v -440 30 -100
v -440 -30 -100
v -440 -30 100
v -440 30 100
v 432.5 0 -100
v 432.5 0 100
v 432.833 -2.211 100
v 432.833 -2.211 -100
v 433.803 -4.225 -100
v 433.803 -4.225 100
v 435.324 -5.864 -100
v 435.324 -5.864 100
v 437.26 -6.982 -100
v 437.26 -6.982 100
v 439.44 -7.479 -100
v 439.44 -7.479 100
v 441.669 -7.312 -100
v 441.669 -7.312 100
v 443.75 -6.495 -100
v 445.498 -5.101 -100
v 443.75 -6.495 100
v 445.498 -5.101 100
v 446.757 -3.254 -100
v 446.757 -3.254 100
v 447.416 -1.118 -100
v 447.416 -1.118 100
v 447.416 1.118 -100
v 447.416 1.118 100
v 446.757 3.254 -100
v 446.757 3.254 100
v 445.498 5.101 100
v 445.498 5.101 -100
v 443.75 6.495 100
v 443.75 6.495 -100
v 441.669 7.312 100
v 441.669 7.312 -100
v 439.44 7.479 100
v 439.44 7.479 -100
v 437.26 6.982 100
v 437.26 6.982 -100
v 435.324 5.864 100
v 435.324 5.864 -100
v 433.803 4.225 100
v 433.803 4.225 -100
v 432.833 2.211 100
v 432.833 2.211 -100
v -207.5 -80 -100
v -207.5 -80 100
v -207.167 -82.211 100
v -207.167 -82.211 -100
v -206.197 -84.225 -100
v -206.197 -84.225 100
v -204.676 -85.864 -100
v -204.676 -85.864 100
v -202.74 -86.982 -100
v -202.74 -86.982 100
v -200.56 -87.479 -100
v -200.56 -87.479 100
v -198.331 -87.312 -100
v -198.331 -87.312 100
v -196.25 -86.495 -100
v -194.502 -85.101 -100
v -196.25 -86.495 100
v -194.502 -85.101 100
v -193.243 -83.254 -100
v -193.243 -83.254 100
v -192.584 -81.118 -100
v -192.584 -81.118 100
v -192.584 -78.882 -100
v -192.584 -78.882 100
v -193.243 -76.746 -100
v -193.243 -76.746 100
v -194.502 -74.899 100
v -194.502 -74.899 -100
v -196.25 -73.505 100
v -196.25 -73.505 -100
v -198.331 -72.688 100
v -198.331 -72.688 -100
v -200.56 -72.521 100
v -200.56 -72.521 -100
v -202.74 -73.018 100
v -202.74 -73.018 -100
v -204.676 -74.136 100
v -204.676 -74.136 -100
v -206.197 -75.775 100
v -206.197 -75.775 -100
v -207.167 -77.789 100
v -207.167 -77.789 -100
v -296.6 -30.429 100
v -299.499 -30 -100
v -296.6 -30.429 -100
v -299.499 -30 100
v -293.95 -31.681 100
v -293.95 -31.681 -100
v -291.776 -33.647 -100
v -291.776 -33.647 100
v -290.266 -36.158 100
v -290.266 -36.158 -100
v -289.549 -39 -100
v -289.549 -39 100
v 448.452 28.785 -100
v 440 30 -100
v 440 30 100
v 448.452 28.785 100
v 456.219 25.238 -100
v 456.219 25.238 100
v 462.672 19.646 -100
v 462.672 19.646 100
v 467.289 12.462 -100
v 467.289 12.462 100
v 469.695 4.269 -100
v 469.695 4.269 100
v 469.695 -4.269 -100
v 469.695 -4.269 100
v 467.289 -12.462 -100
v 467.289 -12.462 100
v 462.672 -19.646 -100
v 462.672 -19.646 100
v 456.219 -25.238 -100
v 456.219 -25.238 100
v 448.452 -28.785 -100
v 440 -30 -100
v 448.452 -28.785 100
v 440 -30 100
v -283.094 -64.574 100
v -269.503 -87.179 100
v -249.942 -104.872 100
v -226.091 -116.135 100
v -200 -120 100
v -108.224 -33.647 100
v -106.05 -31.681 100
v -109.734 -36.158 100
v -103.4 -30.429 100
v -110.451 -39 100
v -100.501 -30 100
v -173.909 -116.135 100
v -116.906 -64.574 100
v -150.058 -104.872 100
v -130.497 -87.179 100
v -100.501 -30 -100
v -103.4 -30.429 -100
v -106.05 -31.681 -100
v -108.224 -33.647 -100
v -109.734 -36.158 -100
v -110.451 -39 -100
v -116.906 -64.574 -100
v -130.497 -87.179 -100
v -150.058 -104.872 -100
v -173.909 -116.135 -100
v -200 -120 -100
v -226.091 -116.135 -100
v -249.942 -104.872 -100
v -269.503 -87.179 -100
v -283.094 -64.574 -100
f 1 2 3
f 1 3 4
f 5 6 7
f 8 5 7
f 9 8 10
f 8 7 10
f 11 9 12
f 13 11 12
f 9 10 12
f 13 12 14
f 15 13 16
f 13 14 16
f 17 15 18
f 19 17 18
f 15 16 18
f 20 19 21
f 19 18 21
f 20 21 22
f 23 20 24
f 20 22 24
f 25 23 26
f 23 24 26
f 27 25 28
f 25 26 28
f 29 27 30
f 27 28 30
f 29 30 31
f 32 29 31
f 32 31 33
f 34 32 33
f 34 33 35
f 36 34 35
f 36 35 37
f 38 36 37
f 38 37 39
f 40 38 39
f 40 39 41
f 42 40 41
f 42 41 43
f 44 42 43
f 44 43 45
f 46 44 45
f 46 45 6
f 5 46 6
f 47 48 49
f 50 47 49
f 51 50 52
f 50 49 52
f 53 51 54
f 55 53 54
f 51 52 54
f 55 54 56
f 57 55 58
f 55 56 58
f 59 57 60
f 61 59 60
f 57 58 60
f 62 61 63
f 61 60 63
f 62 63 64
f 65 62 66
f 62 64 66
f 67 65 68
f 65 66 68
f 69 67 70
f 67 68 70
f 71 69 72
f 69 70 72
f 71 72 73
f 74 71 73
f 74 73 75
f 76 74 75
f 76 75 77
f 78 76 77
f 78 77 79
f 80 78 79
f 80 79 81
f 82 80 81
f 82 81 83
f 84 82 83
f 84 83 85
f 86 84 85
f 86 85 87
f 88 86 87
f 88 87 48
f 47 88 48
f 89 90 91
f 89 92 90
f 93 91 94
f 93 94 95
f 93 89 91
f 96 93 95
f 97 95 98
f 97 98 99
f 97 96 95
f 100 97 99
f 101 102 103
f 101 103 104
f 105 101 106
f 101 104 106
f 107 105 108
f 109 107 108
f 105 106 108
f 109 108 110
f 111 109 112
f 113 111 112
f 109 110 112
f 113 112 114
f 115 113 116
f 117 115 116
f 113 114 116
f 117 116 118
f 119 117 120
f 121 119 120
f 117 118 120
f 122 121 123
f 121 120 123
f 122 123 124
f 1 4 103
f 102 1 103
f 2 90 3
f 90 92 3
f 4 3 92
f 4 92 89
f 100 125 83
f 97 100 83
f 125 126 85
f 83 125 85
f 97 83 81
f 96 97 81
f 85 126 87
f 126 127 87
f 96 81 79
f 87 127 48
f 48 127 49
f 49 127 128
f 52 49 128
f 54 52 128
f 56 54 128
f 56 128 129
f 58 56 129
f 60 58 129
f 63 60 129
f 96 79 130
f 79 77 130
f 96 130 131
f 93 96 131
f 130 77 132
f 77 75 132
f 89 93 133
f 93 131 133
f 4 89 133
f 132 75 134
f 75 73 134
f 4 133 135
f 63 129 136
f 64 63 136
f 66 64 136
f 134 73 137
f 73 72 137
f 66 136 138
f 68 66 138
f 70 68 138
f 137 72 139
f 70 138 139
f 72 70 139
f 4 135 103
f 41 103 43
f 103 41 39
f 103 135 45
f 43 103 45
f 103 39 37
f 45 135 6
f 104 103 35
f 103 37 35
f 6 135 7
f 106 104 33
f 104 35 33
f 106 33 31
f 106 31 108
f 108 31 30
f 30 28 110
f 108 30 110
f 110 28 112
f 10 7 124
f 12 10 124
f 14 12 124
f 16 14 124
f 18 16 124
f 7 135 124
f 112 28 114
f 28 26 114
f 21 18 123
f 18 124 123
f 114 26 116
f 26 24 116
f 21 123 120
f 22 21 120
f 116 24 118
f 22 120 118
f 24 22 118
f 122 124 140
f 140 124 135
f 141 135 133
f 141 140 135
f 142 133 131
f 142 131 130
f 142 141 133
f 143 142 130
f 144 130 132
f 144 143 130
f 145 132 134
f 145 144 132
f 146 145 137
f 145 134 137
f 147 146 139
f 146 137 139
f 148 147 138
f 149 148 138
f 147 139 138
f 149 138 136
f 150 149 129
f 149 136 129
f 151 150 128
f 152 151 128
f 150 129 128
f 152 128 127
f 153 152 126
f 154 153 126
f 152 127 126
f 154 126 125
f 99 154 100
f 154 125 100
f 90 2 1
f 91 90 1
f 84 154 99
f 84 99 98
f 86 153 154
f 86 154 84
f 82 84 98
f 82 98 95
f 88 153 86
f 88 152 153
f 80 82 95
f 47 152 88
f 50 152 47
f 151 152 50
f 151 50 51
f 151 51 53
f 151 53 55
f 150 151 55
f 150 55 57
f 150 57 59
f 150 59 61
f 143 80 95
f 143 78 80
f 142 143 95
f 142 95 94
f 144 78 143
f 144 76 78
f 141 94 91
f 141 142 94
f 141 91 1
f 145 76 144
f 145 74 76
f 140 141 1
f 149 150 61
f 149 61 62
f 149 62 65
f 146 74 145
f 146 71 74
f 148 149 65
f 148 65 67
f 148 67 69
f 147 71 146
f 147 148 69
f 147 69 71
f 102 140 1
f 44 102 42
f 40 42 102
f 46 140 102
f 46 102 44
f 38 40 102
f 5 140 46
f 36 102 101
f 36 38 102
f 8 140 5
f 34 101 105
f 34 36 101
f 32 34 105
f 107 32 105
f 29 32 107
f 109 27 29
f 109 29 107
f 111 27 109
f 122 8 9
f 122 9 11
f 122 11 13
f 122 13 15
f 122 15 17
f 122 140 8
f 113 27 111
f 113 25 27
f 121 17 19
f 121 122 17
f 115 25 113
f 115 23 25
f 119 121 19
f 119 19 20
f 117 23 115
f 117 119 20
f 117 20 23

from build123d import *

# Parameters (mm, degrees)
BOSS_EXTRUDE1_DEPTH   = 100
SKETCH2_R             = 7.5
CUT_EXTRUDE1_DEPTH    = 525.690384894
FILLET1_R             = 10
BODY_MOVE_COPY1_ANGLE = 180


with BuildPart() as part:
    # Sketch1 → Boss-Extrude1 (new, symmetric)
    with BuildSketch(Plane.XY):
        with BuildLine():
            Line((440, -30), (-440, -30))
            ThreePointArc((-440, -30), (-470, 0), (-440, 30))
            Line((-440, 30), (110, 30))
            ThreePointArc((110, 30), (200, 120), (290, 30))
            Line((290, 30), (440, 30))
            Line((440, 30), (440, -30))
        make_face()
    extrude(amount=BOSS_EXTRUDE1_DEPTH, both=True)

    # Sketch2 → Cut-Extrude1 (cut, through all)
    with BuildSketch(Plane.XY.offset(100)):
        with Locations((-440, 0)):
            Circle(SKETCH2_R)
        with Locations((200, 80)):
            Circle(SKETCH2_R)
    extrude(amount=-CUT_EXTRUDE1_DEPTH, mode=Mode.SUBTRACT)

    # Fillet1
    fillet1_edges = [part.edges().sort_by_distance(p)[0] for p in [
        (110, 30, 0),
        (290, 30, 0),
    ]]
    fillet(fillet1_edges, radius=FILLET1_R)


with BuildPart() as part_1:
    # Body-Move/Copy1: moved
    add(part.part.rotate(Axis((0, 0, 0), (0, 0, 1)), BODY_MOVE_COPY1_ANGLE))


solid = part_1.part
